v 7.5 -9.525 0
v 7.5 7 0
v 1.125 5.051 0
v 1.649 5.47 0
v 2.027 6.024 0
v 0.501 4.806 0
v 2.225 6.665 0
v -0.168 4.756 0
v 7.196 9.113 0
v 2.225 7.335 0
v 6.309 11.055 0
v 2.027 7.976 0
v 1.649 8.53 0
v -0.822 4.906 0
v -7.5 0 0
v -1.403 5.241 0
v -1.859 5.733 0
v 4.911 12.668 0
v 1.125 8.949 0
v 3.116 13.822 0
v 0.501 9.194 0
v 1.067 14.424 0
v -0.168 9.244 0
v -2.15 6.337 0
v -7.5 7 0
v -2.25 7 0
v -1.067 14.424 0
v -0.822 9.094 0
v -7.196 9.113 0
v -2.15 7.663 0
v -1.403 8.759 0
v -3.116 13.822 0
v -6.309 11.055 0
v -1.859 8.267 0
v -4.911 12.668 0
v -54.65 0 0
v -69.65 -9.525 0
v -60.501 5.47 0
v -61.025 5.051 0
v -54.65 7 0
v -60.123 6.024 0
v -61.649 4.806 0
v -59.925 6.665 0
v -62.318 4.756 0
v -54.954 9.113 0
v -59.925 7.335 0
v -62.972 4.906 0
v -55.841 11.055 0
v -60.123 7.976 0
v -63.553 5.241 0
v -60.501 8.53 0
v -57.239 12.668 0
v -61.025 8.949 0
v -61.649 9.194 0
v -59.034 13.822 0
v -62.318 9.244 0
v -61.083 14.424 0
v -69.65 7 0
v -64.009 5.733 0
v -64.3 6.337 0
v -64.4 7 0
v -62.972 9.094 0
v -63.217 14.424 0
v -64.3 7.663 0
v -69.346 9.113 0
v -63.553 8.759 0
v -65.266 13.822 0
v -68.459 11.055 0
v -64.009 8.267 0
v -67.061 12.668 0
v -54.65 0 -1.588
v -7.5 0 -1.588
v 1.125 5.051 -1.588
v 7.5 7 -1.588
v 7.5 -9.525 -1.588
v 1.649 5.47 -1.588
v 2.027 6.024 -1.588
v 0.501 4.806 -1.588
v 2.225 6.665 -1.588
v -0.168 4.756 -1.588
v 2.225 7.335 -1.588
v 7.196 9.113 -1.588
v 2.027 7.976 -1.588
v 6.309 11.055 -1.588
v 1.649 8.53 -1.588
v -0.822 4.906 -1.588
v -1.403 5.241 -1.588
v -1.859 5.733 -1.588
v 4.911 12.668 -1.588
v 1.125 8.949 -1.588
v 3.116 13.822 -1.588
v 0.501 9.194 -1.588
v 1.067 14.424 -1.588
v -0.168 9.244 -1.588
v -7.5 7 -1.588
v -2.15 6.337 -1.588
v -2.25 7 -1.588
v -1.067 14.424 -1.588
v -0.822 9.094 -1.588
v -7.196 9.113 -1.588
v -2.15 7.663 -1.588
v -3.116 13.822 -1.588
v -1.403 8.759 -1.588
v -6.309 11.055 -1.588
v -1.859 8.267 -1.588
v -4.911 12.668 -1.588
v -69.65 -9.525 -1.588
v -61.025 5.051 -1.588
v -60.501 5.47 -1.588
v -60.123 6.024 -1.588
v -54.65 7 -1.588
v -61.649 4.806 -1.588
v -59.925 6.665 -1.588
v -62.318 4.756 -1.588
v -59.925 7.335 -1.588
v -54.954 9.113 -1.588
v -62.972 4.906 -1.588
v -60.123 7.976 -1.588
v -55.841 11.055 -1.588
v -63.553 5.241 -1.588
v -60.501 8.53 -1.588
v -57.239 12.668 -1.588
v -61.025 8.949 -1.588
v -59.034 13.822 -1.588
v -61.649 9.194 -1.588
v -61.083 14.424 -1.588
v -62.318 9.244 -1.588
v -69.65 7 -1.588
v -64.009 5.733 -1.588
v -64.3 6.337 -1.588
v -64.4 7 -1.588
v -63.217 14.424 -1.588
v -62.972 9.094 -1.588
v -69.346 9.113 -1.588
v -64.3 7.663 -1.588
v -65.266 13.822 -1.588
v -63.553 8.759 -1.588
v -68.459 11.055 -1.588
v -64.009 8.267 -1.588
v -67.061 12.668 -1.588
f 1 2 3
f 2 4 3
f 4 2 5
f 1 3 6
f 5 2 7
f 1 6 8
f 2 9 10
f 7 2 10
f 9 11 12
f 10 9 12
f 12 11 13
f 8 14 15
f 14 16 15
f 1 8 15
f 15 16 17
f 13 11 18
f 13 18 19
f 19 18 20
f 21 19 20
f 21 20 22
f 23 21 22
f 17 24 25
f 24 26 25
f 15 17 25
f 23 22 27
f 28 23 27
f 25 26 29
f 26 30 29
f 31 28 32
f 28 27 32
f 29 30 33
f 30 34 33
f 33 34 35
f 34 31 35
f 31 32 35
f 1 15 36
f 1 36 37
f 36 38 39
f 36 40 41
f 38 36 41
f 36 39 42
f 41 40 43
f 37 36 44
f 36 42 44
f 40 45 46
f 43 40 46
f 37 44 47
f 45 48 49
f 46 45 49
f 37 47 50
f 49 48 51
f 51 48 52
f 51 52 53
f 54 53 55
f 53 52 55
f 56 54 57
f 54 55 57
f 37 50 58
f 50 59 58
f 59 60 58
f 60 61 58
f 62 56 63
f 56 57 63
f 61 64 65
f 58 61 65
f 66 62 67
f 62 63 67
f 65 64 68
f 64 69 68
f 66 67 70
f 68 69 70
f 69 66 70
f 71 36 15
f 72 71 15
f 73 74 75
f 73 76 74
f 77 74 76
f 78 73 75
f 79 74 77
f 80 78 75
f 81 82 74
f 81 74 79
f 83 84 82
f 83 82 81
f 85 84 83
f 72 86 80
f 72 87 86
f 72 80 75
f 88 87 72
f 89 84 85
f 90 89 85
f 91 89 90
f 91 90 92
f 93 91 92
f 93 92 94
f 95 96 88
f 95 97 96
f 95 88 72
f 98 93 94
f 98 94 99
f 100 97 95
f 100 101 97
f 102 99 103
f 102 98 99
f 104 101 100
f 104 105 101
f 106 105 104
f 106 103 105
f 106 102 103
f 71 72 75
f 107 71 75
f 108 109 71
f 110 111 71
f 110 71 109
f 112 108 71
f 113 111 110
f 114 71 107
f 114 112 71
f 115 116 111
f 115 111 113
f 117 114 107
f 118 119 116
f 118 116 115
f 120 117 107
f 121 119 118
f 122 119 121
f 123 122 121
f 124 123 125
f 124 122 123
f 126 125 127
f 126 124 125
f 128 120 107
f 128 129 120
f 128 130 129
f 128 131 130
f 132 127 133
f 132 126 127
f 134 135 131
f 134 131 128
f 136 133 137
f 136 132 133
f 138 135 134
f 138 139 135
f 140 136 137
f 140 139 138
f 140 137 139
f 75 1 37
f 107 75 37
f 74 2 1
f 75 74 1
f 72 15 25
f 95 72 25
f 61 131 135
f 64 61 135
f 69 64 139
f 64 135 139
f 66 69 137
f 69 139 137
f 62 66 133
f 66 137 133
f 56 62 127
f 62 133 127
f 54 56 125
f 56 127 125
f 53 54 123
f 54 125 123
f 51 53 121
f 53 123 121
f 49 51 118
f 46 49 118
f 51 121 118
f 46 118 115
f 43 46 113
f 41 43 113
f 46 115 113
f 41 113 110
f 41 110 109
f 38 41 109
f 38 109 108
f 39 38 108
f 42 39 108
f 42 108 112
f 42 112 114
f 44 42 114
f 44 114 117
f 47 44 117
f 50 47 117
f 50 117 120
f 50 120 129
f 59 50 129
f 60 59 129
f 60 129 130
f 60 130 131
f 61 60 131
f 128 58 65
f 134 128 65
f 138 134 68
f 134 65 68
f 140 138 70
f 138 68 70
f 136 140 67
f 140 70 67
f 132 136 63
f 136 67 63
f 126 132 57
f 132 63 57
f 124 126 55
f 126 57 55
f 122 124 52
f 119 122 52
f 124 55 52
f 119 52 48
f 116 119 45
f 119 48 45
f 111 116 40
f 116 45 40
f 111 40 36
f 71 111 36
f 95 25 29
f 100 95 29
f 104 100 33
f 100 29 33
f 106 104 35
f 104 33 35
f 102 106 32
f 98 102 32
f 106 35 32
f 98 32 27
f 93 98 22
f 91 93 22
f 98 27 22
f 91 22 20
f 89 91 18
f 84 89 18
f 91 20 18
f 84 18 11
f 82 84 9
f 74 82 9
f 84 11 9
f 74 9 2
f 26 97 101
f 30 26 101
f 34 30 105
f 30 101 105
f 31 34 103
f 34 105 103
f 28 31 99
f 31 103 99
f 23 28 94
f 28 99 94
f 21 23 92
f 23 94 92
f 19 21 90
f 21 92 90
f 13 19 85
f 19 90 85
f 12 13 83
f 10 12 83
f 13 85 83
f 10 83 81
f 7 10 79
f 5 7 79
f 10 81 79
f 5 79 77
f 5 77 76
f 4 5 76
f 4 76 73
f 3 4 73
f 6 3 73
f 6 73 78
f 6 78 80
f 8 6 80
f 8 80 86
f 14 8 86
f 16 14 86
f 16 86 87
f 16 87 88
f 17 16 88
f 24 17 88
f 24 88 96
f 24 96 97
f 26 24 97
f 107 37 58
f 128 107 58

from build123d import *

# Parameters (mm, degrees)
BASE_FLANGE2_DEPTH   = 1.5875
M4_CLEARANCE_HOLE1_D = 4.5


# Read off the part's stored shape, not the designer's step: Base-Flange2
with BuildPart() as part:
    # Base-Flange2 outline → Base-Flange2 (new body)
    with BuildSketch(Plane(origin=(0, 0, 0), x_dir=(-1, 0, 0), z_dir=(0, 0, -1))):
        with BuildLine():
            Line((69.65, -9.525), (69.65, 7))
            ThreePointArc((69.65, 7), (62.15, 14.5), (54.65, 7))
            Line((54.65, 7), (54.65, 0))
            Line((54.65, 0), (7.5, 0))
            Line((7.5, 0), (7.5, 7))
            ThreePointArc((7.5, 7), (0, 14.5), (-7.5, 7))
            Line((-7.5, 7), (-7.5, -9.525))
            Line((-7.5, -9.525), (69.65, -9.525))
        make_face()
    extrude(amount=BASE_FLANGE2_DEPTH)

    # M4 Clearance Hole1 (through all)
    with Locations(Plane.XY):
        with Locations((0, 7), (-62.15, 7)):
            Hole(M4_CLEARANCE_HOLE1_D / 2)


solid = part.part
